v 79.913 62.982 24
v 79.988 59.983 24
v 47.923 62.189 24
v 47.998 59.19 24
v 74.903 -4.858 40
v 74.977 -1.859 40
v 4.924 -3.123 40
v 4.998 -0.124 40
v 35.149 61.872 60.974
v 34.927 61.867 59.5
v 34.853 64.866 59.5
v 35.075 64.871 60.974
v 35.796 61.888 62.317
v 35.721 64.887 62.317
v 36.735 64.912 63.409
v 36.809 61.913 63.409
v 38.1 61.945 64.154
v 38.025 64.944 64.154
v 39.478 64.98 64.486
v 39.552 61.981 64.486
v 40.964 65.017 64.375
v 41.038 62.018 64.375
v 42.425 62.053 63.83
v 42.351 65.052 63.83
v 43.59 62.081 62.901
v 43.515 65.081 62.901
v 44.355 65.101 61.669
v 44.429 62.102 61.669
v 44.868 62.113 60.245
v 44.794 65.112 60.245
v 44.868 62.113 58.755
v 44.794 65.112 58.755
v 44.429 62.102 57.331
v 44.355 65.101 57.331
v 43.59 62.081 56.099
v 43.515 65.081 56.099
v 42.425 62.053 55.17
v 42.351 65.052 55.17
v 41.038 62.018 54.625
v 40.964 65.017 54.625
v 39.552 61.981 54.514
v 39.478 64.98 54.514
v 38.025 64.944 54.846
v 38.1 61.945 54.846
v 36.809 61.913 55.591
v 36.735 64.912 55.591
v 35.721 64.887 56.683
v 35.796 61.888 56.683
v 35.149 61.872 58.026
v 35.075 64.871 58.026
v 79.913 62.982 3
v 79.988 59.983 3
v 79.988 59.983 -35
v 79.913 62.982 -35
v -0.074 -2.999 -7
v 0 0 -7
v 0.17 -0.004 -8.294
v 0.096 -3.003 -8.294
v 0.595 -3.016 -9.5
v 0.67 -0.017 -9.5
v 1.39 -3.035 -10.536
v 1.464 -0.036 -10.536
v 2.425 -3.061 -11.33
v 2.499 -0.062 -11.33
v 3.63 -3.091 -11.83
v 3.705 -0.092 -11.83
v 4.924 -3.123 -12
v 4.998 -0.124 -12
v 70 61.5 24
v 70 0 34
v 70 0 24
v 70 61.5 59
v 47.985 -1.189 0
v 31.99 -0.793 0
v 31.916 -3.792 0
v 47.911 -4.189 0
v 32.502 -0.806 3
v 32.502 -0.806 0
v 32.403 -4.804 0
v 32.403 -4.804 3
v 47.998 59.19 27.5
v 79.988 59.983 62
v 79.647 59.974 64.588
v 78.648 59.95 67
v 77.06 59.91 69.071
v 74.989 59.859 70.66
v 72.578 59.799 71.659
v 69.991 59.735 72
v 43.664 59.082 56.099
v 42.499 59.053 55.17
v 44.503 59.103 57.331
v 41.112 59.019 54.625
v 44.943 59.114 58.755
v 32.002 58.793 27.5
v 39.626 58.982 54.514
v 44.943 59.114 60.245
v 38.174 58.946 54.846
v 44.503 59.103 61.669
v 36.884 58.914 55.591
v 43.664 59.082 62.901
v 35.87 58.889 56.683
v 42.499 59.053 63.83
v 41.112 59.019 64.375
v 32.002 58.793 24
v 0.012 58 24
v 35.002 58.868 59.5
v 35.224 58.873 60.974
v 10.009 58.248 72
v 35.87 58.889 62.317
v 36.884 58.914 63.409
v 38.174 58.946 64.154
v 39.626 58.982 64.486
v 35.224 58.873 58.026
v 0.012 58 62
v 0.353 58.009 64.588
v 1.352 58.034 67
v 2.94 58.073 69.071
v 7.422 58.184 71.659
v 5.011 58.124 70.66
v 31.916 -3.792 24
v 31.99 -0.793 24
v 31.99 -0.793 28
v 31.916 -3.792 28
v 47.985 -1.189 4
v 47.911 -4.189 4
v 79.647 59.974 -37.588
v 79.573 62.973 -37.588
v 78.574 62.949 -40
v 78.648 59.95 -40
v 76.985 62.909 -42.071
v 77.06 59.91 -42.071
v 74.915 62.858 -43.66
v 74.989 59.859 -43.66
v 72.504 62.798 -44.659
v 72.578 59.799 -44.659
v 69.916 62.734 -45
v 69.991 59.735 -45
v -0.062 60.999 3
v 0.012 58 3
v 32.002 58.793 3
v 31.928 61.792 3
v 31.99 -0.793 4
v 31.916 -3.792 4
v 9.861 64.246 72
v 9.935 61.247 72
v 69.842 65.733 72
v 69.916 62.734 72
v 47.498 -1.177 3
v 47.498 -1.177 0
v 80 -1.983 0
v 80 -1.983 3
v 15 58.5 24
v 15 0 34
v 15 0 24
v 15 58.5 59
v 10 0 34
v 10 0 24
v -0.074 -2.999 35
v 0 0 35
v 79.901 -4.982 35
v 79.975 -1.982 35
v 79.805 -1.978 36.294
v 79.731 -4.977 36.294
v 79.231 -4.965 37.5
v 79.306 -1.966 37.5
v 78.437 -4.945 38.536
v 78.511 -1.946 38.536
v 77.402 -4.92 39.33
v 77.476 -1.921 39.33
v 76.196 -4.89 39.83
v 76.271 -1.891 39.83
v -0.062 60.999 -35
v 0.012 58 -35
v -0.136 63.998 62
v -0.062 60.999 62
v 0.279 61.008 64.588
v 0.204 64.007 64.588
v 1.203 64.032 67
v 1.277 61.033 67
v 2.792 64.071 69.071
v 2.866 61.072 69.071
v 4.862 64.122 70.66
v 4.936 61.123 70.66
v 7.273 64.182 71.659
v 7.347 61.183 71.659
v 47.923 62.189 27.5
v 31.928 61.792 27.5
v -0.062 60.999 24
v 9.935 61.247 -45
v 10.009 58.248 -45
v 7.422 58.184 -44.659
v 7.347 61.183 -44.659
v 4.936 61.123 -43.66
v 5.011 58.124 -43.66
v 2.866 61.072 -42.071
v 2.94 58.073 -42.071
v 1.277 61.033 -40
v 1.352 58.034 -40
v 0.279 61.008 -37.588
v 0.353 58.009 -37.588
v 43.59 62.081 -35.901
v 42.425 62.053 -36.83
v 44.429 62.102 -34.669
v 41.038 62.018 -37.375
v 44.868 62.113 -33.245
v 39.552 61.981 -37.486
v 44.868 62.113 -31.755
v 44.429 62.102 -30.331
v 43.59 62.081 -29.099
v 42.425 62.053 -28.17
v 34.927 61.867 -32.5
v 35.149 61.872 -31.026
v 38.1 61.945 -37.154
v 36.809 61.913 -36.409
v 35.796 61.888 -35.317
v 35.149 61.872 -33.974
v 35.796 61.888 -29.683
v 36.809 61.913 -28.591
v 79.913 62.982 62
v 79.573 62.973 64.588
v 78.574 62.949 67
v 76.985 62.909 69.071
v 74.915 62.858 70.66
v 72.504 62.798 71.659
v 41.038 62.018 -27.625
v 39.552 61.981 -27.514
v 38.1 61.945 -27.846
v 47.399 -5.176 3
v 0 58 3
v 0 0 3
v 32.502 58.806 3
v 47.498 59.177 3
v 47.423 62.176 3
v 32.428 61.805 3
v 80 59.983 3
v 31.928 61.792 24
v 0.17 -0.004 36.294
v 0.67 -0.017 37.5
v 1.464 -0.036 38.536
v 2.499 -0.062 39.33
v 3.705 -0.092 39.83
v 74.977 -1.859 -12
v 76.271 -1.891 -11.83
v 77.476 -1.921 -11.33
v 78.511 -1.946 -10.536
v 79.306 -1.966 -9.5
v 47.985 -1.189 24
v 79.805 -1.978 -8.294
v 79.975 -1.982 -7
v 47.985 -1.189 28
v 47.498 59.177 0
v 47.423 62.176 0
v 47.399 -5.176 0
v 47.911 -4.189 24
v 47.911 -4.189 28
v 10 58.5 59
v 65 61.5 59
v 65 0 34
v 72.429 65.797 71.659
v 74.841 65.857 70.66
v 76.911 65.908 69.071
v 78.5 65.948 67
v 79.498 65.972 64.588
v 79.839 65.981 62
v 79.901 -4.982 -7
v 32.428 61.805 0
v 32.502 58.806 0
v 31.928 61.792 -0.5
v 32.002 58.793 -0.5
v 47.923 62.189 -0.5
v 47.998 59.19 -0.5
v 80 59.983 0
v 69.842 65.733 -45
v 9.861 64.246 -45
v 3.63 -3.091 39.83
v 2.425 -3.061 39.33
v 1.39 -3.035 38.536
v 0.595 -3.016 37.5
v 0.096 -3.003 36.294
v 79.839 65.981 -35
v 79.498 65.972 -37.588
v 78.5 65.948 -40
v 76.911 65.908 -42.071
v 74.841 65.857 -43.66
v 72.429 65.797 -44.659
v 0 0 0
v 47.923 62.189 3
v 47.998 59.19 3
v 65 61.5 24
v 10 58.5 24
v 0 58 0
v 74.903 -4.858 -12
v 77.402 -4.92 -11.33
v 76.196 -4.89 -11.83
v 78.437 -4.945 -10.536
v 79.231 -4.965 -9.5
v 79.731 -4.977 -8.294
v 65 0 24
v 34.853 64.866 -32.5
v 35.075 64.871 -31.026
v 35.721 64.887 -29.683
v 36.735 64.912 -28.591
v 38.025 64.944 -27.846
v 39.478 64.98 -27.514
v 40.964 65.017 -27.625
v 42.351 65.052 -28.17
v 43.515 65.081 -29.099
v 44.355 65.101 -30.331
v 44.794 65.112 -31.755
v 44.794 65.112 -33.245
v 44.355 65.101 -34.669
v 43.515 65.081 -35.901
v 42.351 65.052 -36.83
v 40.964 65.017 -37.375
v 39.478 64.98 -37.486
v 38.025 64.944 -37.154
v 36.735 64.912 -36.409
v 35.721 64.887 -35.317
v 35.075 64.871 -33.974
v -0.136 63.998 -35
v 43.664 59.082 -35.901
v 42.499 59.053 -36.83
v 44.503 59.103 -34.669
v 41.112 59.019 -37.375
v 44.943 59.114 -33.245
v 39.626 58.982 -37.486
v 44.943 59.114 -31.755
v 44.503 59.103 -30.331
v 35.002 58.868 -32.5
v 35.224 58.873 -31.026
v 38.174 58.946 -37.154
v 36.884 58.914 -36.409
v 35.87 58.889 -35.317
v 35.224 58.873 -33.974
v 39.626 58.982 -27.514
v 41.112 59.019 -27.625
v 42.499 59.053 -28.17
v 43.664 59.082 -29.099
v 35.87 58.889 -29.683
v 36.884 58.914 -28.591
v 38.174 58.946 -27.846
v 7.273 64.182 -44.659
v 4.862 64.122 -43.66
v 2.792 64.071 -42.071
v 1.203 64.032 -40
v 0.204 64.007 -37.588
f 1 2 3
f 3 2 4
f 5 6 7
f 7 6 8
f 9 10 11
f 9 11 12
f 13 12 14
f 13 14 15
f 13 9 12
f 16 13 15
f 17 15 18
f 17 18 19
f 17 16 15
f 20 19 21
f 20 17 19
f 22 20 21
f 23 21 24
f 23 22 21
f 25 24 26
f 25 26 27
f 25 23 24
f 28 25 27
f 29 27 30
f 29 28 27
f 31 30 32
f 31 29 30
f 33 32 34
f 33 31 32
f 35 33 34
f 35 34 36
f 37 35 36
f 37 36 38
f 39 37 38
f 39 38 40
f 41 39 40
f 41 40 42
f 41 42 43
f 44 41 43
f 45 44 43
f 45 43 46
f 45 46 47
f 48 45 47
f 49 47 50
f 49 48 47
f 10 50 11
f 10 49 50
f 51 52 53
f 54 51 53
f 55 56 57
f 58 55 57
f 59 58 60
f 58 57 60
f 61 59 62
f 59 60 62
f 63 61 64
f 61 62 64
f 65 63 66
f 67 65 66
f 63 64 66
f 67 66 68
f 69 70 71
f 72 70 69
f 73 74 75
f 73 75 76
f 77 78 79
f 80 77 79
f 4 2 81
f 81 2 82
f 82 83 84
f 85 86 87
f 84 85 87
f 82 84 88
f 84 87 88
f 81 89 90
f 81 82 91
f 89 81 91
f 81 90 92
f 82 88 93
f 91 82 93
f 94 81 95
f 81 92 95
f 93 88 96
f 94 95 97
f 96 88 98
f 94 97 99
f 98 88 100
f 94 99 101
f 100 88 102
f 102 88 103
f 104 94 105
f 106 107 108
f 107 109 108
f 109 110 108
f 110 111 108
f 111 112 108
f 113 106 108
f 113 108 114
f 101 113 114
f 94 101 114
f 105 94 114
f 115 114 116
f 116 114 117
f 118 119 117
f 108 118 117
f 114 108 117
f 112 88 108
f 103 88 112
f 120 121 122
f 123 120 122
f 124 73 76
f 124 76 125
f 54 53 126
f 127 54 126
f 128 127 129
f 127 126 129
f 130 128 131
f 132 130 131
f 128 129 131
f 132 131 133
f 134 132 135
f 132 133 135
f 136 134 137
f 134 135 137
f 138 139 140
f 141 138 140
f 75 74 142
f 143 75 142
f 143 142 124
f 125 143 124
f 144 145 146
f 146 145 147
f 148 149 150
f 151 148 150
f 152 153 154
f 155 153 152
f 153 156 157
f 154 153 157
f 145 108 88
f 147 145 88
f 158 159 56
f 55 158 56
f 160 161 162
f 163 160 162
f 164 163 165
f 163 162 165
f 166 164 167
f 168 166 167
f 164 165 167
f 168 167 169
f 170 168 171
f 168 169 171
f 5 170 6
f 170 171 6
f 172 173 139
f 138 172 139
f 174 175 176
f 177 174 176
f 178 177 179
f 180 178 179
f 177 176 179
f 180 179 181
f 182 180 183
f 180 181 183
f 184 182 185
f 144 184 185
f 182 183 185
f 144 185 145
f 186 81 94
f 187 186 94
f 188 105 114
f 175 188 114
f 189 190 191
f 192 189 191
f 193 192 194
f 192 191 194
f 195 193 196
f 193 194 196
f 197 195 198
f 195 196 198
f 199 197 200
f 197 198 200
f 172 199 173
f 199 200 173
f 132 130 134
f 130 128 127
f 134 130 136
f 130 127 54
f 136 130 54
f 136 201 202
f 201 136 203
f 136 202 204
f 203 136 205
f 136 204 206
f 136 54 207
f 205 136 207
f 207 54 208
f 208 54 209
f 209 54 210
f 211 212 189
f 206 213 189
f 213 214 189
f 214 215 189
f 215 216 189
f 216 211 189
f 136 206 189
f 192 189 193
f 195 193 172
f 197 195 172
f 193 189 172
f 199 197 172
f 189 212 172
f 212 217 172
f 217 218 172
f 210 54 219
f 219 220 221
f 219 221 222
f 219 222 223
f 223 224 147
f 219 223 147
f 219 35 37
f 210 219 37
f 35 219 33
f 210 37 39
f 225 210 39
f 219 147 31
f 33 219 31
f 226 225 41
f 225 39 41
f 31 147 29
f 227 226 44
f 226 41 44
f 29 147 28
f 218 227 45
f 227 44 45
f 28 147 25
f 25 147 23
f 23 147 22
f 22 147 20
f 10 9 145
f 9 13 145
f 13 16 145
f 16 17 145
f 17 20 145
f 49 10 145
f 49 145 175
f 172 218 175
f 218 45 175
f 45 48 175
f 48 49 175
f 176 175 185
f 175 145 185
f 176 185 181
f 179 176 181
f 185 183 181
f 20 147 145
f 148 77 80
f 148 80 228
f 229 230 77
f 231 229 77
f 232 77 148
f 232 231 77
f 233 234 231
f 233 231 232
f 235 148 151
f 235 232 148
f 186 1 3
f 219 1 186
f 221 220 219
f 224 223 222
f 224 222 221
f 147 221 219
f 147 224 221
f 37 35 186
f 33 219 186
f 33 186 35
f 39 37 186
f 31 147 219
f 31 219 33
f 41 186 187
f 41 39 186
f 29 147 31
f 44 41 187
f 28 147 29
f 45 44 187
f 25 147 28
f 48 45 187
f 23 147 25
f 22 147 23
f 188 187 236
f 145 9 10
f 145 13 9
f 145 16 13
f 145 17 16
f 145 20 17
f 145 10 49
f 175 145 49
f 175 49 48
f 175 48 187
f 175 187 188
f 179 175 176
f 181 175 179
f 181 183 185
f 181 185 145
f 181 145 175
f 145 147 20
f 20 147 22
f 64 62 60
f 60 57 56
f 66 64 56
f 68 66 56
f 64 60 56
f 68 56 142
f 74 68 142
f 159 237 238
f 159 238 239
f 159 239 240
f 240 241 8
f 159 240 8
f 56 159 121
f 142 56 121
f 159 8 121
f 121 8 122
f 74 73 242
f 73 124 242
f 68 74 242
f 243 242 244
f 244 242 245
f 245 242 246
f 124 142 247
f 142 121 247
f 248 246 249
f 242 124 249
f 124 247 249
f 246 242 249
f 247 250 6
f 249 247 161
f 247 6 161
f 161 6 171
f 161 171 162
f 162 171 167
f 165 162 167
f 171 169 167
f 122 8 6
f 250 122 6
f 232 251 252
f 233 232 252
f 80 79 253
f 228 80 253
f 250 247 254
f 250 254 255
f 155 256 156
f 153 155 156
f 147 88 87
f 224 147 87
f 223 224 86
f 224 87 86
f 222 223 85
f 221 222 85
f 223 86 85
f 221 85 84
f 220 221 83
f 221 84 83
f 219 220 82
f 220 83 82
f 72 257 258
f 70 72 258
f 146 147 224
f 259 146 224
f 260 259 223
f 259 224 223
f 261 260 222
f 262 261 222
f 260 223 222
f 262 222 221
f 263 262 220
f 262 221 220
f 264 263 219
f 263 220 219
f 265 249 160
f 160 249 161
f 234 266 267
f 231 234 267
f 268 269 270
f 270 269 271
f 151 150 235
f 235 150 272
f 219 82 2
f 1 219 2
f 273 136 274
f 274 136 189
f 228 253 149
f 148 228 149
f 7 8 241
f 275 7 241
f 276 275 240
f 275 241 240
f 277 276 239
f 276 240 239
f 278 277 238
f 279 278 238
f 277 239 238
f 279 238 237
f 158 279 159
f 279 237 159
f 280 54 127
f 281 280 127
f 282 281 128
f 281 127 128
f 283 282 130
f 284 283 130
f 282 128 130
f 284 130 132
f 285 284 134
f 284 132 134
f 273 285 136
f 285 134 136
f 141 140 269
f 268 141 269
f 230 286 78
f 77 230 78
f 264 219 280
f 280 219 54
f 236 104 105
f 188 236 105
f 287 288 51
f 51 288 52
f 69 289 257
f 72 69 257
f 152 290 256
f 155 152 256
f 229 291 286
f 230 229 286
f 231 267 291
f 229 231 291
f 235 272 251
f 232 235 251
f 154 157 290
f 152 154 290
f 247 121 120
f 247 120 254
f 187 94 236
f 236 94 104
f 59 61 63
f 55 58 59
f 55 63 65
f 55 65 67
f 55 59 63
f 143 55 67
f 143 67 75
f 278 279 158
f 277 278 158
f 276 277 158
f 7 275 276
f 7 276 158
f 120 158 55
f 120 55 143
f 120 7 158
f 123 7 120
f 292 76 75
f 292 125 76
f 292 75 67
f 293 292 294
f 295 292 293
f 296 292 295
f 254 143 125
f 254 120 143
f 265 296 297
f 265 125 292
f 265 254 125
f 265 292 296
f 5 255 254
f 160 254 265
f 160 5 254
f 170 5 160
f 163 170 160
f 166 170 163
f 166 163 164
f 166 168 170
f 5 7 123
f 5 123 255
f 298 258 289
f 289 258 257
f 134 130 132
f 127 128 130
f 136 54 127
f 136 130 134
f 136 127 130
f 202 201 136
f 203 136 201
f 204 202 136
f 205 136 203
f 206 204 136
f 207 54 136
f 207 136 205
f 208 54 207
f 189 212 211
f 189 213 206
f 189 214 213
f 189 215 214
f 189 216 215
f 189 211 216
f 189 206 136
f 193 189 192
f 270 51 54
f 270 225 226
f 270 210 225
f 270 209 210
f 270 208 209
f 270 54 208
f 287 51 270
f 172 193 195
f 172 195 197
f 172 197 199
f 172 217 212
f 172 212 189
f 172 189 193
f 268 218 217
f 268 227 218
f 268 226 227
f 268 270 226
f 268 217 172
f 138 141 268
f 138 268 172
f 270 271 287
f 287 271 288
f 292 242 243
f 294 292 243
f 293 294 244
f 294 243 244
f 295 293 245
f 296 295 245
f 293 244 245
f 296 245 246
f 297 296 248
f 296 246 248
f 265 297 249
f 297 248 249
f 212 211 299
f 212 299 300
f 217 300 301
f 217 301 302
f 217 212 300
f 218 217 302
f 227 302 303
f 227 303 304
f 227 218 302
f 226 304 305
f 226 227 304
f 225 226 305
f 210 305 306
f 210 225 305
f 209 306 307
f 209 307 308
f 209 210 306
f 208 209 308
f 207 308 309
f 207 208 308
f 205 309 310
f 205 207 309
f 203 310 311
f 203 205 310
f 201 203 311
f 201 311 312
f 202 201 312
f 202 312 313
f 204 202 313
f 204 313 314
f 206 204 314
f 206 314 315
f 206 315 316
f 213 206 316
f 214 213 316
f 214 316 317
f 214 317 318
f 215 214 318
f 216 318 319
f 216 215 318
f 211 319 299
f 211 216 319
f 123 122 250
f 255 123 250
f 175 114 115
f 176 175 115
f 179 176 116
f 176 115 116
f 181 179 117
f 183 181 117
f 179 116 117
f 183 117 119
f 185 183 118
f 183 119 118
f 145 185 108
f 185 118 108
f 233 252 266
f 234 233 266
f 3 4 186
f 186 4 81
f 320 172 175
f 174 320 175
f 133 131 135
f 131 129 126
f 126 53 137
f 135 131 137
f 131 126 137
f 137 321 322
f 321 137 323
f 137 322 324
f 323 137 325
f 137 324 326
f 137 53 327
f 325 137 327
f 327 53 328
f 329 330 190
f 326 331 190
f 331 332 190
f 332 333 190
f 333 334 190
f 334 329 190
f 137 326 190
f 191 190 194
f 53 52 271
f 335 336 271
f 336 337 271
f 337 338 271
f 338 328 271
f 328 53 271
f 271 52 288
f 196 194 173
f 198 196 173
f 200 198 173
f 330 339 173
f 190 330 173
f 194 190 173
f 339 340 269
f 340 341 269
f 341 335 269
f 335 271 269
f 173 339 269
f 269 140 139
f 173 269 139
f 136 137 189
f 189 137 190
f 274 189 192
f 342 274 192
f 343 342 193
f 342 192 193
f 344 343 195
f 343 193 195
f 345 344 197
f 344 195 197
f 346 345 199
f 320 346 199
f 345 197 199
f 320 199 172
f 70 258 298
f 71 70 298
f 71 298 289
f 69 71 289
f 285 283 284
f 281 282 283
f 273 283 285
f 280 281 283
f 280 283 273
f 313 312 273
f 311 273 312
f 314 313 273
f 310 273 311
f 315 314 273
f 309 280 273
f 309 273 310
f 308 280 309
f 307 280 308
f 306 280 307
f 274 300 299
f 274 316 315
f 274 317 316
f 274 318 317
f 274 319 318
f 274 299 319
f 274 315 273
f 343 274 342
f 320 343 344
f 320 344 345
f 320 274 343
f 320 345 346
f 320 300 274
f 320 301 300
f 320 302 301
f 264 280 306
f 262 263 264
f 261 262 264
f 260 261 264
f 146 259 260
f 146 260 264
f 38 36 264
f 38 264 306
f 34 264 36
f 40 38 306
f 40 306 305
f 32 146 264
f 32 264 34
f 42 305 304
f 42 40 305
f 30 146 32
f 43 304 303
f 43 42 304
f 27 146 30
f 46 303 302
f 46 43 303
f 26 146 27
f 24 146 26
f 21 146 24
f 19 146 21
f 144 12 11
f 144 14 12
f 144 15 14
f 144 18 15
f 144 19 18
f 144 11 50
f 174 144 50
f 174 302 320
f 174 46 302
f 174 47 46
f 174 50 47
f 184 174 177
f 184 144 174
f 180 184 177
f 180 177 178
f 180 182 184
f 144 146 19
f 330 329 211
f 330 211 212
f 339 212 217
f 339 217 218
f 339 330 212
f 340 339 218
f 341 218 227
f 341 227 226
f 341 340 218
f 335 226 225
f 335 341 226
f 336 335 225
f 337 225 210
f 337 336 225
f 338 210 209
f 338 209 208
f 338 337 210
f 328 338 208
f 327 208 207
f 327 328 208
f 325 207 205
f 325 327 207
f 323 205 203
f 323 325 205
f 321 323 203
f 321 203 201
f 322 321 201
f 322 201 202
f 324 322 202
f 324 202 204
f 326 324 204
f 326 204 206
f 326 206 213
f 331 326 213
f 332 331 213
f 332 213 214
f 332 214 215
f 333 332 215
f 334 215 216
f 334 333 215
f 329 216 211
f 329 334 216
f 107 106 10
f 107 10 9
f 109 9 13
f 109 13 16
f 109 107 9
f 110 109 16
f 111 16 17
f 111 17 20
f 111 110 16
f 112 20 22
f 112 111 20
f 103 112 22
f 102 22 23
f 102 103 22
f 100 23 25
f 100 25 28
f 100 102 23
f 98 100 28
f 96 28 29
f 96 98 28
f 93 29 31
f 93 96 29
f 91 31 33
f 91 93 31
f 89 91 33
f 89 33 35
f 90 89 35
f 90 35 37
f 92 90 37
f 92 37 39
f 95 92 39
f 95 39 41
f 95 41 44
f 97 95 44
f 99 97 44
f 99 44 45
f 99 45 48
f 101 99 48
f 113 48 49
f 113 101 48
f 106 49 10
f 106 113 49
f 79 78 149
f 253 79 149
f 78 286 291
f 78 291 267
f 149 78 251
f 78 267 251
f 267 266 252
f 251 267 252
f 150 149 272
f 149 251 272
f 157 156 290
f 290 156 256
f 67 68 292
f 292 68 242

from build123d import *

# Parameters (mm, degrees)
F1_DEPTH  = 3
F2_W      = 16
F2_H      = 4
F3_DEPTH  = 3
F4_R      = 5
F5_DEPTH  = 3
F6_R      = 5
F7_DEPTH  = 3
F9_DEPTH  = 5
F12_DEPTH = 5


with BuildPart() as f1:
    # F0 (on Top) → F1 (new body)
    with BuildSketch(Plane.XY):
        Polygon((32.502303, 58.805691), (0, 58), (0, 0), (32.502303, -0.805691), (32.403179, -4.804463), (47.398572, -5.17618), (47.497697, -1.177409), (80, -1.9831), (80, 59.9831), (47.497697, 59.177409), (47.423353, 62.176487), (32.42796, 61.80477), align=None)
    extrude(amount=F1_DEPTH)


with BuildPart() as f3:
    # F2 (on face) → F3 (new body)
    with BuildSketch(Plane(origin=(0, 0, 0), x_dir=(0.999693, -0.024781, 0), z_dir=(-0.024781, -0.999693, 0))):
        with BuildLine():
            ThreePointArc((0, -7), (1.464466, -10.535534), (5, -12))
            Line((5, -12), (75, -12))
            ThreePointArc((75, -12), (78.535534, -10.535534), (80, -7))
            Line((80, -7), (80, 35))
            ThreePointArc((80, 35), (78.535534, 38.535534), (75, 40))
            Line((75, 40), (5, 40))
            ThreePointArc((5, 40), (1.464466, 38.535534), (0, 35))
            Line((0, 35), (0, -7))
        make_face()
        with Locations((40, 2)):
            Rectangle(F2_W, F2_H, mode=Mode.SUBTRACT)
        with Locations((40, 26)):
            Rectangle(F2_W, F2_H, mode=Mode.SUBTRACT)
    extrude(amount=F3_DEPTH)


with BuildPart() as f5:
    # F4 (on face) → F5 (new body)
    with BuildSketch(Plane(origin=(-1.436865, 57.964382, 0), x_dir=(-0.999693, -0.024781, 0), z_dir=(-0.024781, 0.999693, 0))):
        with BuildLine():
            ThreePointArc((-81.449594, -35), (-78.520662, -42.071068), (-71.449594, -45))
            Line((-71.449594, -45), (-11.449594, -45))
            ThreePointArc((-11.449594, -45), (-4.378526, -42.071068), (-1.449594, -35))
            Line((-1.449594, -35), (-1.449594, 3))
            Line((-1.449594, 3), (-33.449594, 3))
            Line((-33.449594, 3), (-33.449594, -0.5))
            Line((-33.449594, -0.5), (-49.449594, -0.5))
            Line((-49.449594, -0.5), (-49.449594, 3))
            Line((-49.449594, 3), (-81.449594, 3))
            Line((-81.449594, 3), (-81.449594, -35))
        make_face()
        with Locations((-41.449594, -32.5)):
            Circle(F4_R, mode=Mode.SUBTRACT)
        with BuildLine():
            Line((-11.449594, 72), (-71.449594, 72))
            ThreePointArc((-71.449594, 72), (-78.520662, 69.071068), (-81.449594, 62))
            Line((-81.449594, 62), (-81.449594, 24))
            Line((-81.449594, 24), (-49.449594, 24))
            Line((-49.449594, 24), (-49.449594, 27.5))
            Line((-49.449594, 27.5), (-33.449594, 27.5))
            Line((-33.449594, 27.5), (-33.449594, 24))
            Line((-33.449594, 24), (-1.449594, 24))
            Line((-1.449594, 24), (-1.449594, 62))
            ThreePointArc((-1.449594, 62), (-4.378526, 69.071068), (-11.449594, 72))
        make_face()
        with Locations((-41.449594, 59.5)):
            Circle(F4_R, mode=Mode.SUBTRACT)
    extrude(amount=F5_DEPTH)


with BuildPart() as f7:
    # F6 (on face) → F7 (new body)
    with BuildSketch(Plane(origin=(-1.511208, 60.963461, 0), x_dir=(-0.999693, -0.024781, 0), z_dir=(-0.024781, 0.999693, 0))):
        with BuildLine():
            ThreePointArc((-81.449594, -35), (-78.520662, -42.071068), (-71.449594, -45))
            Line((-71.449594, -45), (-11.449594, -45))
            ThreePointArc((-11.449594, -45), (-4.378526, -42.071068), (-1.449594, -35))
            Line((-1.449594, -35), (-1.449594, 62))
            ThreePointArc((-1.449594, 62), (-4.378526, 69.071068), (-11.449594, 72))
            Line((-11.449594, 72), (-71.449594, 72))
            ThreePointArc((-71.449594, 72), (-78.520662, 69.071068), (-81.449594, 62))
            Line((-81.449594, 62), (-81.449594, -35))
        make_face()
        with Locations((-41.449594, -32.5)):
            Circle(F6_R, mode=Mode.SUBTRACT)
        with Locations((-41.449594, 59.5)):
            Circle(F6_R, mode=Mode.SUBTRACT)
    extrude(amount=F7_DEPTH)


with BuildPart() as f9:
    # F8 (on Right) → F9 (new body)
    with BuildSketch(Plane.YZ):
        Polygon((0, 24), (58.5, 24), (58.5, 59), (0, 34), align=None)
    extrude(amount=F9_DEPTH)


with BuildPart() as f9_1:
    # F10: moved
    add(f9.part.moved(Location((10, 0, 0))))


with BuildPart() as f12:
    # F11 (on Right) → F12 (new body)
    with BuildSketch(Plane.YZ):
        Polygon((0, 34), (0, 24), (61.5, 24), (61.5, 59), align=None)
    extrude(amount=F12_DEPTH)


with BuildPart() as f12_1:
    # F13: moved
    add(f12.part.moved(Location((65, 0, 0))))


solid = Compound([f1.part, f3.part, f5.part, f7.part, f9_1.part, f12_1.part])
